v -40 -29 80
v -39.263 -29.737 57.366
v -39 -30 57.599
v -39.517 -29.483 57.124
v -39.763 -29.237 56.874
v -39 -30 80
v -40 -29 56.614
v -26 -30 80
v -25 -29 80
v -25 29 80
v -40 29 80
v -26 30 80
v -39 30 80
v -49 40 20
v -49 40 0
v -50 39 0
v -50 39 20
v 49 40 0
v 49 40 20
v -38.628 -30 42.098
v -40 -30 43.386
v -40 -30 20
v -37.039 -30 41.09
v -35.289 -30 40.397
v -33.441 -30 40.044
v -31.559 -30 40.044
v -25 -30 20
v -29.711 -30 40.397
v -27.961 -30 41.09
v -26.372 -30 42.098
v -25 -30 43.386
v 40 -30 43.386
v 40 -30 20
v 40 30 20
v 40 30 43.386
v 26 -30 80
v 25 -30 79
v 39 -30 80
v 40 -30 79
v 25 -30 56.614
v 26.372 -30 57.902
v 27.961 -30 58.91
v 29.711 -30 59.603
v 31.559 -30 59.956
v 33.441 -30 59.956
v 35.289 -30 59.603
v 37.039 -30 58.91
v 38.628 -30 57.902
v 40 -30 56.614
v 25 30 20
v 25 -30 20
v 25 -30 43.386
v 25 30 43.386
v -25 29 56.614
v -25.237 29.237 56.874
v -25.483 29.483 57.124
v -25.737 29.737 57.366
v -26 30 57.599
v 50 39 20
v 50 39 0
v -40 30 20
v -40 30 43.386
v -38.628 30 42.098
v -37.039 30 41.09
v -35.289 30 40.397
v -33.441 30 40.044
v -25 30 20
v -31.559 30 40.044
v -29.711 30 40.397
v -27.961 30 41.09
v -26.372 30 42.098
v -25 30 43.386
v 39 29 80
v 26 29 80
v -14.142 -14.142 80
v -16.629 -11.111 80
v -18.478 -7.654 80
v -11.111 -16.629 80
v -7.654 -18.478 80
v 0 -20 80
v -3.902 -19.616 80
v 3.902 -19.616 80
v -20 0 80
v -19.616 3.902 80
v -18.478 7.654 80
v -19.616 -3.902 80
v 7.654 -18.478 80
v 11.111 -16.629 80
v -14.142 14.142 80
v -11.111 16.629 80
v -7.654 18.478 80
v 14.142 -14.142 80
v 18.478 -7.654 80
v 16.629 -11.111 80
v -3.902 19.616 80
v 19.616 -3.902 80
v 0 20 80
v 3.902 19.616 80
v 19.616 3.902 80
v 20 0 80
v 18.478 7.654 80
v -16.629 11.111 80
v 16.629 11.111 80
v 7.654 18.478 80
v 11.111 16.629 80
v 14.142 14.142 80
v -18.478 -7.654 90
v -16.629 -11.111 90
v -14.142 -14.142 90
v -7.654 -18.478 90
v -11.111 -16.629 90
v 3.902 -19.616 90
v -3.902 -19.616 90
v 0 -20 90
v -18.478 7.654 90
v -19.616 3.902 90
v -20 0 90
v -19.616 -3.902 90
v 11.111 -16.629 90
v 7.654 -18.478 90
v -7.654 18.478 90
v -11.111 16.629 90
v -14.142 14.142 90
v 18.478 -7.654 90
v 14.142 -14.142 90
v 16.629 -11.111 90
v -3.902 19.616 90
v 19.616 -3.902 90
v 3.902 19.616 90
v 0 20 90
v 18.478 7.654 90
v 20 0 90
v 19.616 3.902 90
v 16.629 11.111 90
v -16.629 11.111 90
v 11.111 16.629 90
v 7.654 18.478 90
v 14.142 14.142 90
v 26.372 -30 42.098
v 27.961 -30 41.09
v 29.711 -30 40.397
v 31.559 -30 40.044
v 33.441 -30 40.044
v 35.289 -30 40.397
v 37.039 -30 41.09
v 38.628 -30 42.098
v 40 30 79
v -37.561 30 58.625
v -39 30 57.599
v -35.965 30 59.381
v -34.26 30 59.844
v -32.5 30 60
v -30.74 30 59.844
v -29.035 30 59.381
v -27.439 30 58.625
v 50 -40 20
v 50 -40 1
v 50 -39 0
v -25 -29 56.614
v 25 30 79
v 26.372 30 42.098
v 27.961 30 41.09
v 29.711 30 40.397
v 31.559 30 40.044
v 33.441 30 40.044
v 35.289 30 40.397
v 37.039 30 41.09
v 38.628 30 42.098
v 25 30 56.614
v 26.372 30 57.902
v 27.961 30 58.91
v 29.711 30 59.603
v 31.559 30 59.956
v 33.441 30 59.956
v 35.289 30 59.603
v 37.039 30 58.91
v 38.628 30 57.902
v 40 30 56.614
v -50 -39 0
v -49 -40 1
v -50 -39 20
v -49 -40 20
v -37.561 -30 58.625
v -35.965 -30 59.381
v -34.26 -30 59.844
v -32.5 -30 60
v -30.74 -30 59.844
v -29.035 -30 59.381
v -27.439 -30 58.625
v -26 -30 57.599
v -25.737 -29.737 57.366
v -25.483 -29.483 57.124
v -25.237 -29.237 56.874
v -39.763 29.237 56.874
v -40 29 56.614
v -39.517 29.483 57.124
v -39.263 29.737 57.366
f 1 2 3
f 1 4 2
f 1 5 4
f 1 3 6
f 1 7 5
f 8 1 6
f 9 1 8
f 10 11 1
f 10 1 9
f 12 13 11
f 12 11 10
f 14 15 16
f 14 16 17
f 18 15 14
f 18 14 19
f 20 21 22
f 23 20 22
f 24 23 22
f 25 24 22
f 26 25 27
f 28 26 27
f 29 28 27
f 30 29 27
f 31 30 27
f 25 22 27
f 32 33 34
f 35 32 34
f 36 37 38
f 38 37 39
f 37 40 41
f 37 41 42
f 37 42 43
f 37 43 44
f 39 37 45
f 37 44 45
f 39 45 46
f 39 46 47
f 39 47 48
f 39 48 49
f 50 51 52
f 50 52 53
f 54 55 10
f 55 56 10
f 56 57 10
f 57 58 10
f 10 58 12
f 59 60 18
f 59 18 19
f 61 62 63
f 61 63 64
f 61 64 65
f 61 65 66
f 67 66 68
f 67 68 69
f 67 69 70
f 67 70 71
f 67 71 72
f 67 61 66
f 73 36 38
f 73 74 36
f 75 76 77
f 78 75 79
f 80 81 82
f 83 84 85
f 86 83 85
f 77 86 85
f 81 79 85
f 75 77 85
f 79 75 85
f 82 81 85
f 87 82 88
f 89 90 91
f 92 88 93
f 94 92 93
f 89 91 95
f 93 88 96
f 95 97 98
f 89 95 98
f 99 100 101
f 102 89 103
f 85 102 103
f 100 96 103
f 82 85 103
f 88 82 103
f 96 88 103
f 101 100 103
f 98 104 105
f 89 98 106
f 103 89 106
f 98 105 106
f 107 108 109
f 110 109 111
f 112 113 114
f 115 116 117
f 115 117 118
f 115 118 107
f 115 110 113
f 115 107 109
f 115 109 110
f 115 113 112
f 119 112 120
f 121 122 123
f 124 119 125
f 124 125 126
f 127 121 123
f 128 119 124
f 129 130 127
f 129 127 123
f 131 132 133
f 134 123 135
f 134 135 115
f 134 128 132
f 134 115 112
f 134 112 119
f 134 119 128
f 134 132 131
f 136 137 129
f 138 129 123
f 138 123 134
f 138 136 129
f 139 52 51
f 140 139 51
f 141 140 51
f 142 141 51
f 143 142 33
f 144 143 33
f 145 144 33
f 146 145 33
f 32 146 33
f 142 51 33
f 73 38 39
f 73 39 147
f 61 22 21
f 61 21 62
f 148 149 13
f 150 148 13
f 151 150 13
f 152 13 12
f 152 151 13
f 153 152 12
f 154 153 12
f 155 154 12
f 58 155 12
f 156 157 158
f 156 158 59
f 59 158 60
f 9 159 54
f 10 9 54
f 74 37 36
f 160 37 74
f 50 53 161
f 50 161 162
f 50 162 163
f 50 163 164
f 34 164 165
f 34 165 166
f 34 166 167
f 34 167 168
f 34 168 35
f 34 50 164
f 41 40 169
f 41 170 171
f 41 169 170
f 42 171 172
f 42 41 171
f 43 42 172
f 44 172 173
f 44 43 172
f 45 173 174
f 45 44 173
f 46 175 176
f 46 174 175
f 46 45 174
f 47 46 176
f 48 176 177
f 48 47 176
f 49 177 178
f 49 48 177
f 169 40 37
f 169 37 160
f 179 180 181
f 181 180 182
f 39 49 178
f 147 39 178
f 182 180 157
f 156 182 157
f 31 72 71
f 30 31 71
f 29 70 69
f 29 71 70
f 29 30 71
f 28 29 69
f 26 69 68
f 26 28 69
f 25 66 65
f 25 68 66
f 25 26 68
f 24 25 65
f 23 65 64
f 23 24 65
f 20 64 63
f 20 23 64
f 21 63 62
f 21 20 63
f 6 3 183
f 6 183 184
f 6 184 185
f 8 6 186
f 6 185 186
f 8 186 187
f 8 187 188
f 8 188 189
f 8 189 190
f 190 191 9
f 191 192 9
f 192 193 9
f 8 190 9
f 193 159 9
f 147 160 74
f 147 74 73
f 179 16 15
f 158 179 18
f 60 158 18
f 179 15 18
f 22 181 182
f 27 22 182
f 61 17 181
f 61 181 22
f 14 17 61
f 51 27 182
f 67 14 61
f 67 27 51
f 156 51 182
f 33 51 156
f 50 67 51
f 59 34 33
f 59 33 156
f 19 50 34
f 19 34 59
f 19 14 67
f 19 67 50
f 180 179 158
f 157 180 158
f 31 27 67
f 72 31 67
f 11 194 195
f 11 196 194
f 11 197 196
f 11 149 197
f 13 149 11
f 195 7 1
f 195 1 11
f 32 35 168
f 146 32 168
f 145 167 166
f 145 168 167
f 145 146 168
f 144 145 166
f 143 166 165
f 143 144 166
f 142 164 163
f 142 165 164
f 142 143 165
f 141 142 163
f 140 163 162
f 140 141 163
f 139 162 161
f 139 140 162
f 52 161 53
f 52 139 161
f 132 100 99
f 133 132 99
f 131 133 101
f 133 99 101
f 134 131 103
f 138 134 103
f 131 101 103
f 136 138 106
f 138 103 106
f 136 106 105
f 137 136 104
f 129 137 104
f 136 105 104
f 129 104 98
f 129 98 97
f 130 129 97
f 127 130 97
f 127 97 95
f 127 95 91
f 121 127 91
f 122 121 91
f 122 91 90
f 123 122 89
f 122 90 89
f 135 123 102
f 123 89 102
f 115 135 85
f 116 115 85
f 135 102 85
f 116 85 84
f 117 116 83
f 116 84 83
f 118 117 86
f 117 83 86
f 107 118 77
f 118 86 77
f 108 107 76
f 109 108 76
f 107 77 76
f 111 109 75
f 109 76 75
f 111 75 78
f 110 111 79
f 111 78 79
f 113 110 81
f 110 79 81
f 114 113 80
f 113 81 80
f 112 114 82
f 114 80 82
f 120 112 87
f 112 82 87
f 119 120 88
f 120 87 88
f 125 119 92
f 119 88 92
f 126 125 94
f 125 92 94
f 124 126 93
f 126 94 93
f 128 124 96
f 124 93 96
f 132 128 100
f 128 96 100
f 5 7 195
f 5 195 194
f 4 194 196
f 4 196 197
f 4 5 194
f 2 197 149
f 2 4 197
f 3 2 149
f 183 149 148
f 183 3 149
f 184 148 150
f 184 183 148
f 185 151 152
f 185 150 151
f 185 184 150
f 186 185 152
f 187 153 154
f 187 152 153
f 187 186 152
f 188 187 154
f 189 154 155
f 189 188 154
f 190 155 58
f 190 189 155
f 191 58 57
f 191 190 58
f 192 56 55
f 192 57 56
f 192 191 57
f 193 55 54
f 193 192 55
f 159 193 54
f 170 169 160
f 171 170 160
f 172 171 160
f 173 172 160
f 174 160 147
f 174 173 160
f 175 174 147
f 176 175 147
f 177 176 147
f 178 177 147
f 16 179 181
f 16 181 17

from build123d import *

# Parameters (mm, degrees)
SKETCH1_W               = 100
SKETCH1_H               = 80
BOSS_EXTRUDE1_DEPTH     = 20
SKETCH2_W               = 15
SKETCH2_H               = 60
BOSS_EXTRUDE2_DEPTH     = 60
CUT_EXTRUDE1_DEPTH      = 100
CUT_EXTRUDE1_DEPTH_BACK = 100
SKETCH3_R               = 10
SKETCH4_R               = 20
BOSS_EXTRUDE3_DEPTH     = 10
CHAMFER1_SIZE           = 1
CHAMFER2_SIZE           = 1
CHAMFER3_SIZE           = 1


with BuildPart() as part:
    # Sketch1 → Boss-Extrude1 (new body)
    with BuildSketch(Plane.XY):
        Rectangle(SKETCH1_W, SKETCH1_H)
    extrude(amount=BOSS_EXTRUDE1_DEPTH)

    # Sketch2 → Boss-Extrude2 (add)
    with BuildSketch(Plane.XY.offset(20)):
        with Locations((-32.5, 0)):
            Rectangle(SKETCH2_W, SKETCH2_H)
        with Locations((32.5, 0)):
            Rectangle(SKETCH2_W, SKETCH2_H)
    extrude(amount=BOSS_EXTRUDE2_DEPTH)

    # Sketch3 → Cut-Extrude1 (cut, two sides: drawn at the far end of the back side and taken through both)
    with BuildSketch(Plane(origin=(0, 0, 0), x_dir=(1, 0, 0), z_dir=(0, 1, 0)).offset(-CUT_EXTRUDE1_DEPTH_BACK)):
        with Locations((-32.5, -50)):
            Circle(SKETCH3_R)
        with Locations((32.5, -50)):
            Circle(SKETCH3_R)
    extrude(amount=CUT_EXTRUDE1_DEPTH + CUT_EXTRUDE1_DEPTH_BACK, mode=Mode.SUBTRACT)


with BuildPart() as cut_extrude1_piece_1:
    # of the separate pieces the step leaves, piece 1, a body of its own (cut_extrude1_pieces)
    add(part.part.solids().sort_by_distance((-50, -40, 0))[0])

    # Chamfer1
    chamfer1_edges = [cut_extrude1_piece_1.edges().sort_by_distance(p)[0] for p in [
        (50, 40, 10),
        (-50, 40, 10),
        (0, -40, 0),
        (-50, -40, 10),
    ]]
    chamfer(chamfer1_edges, length=CHAMFER1_SIZE)


with BuildPart() as cut_extrude1_piece_2:
    # of the separate pieces the step leaves, piece 2, a body of its own (cut_extrude1_pieces)
    add(part.part.solids().sort_by_distance((-40, -30, 56.614378278))[0])

    # Chamfer2
    chamfer2_edges = [cut_extrude1_piece_2.edges().sort_by_distance(p)[0] for p in [
        (-40, -30, 68.307189139),
        (-40, 30, 68.307189139),
        (-25, 30, 68.307189139),
        (-25, -30, 68.307189139),
    ]]
    chamfer(chamfer2_edges, length=CHAMFER2_SIZE)


with BuildPart() as cut_extrude1_piece_3:
    # of the separate pieces the step leaves, piece 3, a body of its own (cut_extrude1_pieces)
    add(part.part.solids().sort_by_distance((25, -30, 56.614378278))[0])

    # Chamfer3
    chamfer3_edges = [cut_extrude1_piece_3.edges().sort_by_distance(p)[0] for p in [
        (40, 0, 80),
        (32.5, 30, 80),
        (25, 0, 80),
    ]]
    chamfer(chamfer3_edges, length=CHAMFER3_SIZE)


with BuildPart() as body_4:
    # Sketch4 → Boss-Extrude3 (new body)
    with BuildSketch(Plane.XY.offset(80)):
        Circle(SKETCH4_R)
    extrude(amount=BOSS_EXTRUDE3_DEPTH)


solid = Compound([cut_extrude1_piece_1.part, cut_extrude1_piece_2.part, cut_extrude1_piece_3.part, body_4.part])
